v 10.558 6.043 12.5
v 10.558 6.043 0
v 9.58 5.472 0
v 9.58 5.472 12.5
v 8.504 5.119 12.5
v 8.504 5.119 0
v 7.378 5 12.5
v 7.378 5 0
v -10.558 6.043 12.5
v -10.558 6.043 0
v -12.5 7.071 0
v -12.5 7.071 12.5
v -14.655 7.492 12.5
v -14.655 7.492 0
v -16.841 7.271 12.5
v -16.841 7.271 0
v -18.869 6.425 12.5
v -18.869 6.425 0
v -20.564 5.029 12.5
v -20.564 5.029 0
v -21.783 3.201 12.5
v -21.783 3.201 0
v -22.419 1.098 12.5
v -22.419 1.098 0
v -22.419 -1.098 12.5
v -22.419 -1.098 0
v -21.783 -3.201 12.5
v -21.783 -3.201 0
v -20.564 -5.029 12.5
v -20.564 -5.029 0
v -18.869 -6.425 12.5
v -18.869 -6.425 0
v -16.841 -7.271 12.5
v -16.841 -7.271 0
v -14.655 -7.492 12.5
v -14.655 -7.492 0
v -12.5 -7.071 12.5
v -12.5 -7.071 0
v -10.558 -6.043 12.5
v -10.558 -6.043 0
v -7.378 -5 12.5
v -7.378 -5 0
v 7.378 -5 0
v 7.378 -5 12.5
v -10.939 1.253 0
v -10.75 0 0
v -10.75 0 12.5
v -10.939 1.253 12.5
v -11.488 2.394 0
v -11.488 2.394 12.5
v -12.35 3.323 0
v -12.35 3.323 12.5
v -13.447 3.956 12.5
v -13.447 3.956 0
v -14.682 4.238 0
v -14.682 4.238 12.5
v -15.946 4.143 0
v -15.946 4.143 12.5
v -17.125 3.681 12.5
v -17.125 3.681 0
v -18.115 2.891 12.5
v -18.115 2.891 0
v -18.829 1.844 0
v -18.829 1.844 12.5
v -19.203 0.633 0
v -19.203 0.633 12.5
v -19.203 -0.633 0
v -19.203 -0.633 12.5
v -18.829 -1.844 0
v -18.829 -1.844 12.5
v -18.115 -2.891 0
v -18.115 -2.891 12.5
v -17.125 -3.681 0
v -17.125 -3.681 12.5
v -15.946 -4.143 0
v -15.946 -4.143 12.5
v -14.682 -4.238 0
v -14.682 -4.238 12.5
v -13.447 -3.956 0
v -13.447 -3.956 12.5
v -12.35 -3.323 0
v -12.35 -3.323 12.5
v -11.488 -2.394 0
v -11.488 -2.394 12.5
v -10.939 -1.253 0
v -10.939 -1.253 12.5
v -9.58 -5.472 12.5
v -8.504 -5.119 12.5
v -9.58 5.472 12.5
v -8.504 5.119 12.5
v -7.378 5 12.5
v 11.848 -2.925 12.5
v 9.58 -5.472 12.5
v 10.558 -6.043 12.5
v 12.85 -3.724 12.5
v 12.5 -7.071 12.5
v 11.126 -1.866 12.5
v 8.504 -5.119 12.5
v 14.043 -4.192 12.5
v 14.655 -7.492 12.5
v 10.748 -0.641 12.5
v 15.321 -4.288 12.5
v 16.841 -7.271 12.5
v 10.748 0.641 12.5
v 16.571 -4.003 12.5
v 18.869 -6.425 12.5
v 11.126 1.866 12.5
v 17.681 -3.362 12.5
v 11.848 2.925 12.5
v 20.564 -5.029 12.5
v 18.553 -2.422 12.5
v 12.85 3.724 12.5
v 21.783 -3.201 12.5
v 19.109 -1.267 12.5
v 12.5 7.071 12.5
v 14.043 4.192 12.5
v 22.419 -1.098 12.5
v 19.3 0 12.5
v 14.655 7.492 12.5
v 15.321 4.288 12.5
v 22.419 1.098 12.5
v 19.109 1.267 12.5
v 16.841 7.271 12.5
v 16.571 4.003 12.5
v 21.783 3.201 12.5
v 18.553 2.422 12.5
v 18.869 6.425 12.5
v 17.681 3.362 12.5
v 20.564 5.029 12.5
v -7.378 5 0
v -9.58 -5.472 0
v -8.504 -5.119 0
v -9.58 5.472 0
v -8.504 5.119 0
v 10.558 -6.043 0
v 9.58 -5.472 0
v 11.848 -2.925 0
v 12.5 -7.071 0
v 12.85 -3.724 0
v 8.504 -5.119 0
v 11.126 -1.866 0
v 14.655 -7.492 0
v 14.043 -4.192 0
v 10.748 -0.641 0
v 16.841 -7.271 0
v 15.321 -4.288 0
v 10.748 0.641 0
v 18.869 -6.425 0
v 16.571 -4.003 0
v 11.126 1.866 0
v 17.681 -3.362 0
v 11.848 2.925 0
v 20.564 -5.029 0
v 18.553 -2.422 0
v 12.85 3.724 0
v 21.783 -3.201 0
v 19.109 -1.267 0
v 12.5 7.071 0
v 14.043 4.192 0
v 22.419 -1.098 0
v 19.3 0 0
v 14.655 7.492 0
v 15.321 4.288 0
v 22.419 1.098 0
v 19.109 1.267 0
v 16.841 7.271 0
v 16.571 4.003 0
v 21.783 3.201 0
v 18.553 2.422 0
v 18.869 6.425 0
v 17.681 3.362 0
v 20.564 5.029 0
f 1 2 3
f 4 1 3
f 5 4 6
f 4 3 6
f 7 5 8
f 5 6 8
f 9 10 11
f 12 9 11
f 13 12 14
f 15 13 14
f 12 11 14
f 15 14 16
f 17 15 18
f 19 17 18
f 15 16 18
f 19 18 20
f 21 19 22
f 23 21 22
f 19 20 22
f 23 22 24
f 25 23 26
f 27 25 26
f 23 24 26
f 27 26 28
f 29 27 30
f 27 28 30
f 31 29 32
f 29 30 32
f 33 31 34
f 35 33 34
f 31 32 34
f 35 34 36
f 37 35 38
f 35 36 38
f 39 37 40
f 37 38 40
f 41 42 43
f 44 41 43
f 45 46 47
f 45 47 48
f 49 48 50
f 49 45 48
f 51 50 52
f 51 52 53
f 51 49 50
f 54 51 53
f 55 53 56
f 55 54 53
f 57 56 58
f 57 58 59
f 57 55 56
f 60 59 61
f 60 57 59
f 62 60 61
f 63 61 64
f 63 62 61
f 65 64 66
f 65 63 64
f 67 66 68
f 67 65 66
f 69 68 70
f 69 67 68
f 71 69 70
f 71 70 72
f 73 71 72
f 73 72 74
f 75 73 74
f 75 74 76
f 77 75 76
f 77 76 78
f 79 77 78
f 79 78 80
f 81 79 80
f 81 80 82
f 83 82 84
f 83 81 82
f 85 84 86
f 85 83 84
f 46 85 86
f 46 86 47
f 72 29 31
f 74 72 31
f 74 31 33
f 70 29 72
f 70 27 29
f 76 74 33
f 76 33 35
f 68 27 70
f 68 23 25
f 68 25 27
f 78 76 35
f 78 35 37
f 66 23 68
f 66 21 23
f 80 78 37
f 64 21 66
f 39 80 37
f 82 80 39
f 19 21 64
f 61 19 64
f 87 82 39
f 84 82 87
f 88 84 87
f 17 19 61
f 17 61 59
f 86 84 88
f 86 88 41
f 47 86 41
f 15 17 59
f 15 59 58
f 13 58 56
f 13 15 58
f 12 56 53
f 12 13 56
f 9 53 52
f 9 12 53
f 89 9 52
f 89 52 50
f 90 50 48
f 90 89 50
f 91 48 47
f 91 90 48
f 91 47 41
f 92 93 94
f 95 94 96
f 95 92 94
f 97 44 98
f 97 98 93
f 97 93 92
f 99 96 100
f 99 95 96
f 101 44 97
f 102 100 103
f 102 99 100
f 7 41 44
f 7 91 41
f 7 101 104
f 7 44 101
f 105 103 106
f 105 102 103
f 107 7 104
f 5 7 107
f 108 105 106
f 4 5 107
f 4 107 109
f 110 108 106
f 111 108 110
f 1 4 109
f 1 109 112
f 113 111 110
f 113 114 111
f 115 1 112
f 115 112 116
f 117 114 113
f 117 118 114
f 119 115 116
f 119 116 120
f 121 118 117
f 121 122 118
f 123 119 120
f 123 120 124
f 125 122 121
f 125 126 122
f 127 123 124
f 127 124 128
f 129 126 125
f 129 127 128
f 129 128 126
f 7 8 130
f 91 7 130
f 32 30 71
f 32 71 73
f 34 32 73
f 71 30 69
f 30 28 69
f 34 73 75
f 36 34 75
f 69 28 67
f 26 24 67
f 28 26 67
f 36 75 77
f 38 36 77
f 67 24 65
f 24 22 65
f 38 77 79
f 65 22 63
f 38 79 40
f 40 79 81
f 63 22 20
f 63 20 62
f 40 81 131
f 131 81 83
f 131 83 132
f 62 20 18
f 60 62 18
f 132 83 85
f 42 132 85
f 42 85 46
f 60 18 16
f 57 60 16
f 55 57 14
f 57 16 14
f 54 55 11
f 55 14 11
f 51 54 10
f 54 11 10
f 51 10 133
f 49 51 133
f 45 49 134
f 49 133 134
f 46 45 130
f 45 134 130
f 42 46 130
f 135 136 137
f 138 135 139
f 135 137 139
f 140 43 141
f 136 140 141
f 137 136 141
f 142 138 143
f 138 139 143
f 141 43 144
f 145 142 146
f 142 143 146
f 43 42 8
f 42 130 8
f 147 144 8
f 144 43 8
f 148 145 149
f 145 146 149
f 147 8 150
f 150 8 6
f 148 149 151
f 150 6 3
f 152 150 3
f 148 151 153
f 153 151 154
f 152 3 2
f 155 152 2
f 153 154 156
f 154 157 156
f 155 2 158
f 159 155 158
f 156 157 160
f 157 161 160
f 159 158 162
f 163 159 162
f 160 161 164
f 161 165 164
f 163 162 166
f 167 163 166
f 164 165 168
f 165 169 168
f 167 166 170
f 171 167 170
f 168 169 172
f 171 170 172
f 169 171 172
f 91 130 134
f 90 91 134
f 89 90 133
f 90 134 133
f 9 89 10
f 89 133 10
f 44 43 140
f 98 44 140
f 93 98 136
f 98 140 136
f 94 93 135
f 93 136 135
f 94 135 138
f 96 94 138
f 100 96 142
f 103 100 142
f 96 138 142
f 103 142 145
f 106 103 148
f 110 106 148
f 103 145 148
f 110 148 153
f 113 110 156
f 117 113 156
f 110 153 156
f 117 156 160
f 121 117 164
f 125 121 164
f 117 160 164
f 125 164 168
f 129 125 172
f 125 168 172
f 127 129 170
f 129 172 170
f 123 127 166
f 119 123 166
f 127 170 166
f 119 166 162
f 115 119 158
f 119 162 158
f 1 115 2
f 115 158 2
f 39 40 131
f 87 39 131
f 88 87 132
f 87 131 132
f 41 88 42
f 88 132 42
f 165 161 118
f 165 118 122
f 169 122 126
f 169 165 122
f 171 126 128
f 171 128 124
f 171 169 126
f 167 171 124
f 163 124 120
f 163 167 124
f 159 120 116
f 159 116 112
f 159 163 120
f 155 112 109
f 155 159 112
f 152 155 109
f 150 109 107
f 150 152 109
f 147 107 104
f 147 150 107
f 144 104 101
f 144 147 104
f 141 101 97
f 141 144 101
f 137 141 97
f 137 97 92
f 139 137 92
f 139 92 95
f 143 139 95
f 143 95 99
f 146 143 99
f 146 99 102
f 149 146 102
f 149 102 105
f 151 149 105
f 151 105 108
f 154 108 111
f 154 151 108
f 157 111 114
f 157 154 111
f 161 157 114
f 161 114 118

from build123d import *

# Parameters (mm, degrees)
CROQUIS1_R              = 4.25
CROQUIS1_R_2            = 4.3
SALIENTE_EXTRUIR1_DEPTH = 12.5


with BuildPart() as part:
    # Croquis1 → Saliente-Extruir1 (new body)
    with BuildSketch(Plane.XY):
        with BuildLine():
            Line((-7.377684836, -5), (7.377684836, -5))
            ThreePointArc((7.377684836, -5), (9.051224581, -5.267438742), (10.558069892, -6.04311649))
            ThreePointArc((10.558069892, -6.04311649), (22.5, 0), (10.558069892, 6.04311649))
            ThreePointArc((10.558069892, 6.04311649), (9.051224581, 5.267438742), (7.377684836, 5))
            Line((7.377684836, 5), (-7.377684836, 5))
            ThreePointArc((-7.377684836, 5), (-9.051224581, 5.267438742), (-10.558069892, 6.04311649))
            ThreePointArc((-10.558069892, 6.04311649), (-22.5, 0), (-10.558069892, -6.04311649))
            ThreePointArc((-10.558069892, -6.04311649), (-9.051224581, -5.267438742), (-7.377684836, -5))
        make_face()
        with Locations((-15, 0)):
            Circle(CROQUIS1_R, mode=Mode.SUBTRACT)
        with Locations((15, 0)):
            Circle(CROQUIS1_R_2, mode=Mode.SUBTRACT)
    extrude(amount=SALIENTE_EXTRUIR1_DEPTH)


solid = part.part
